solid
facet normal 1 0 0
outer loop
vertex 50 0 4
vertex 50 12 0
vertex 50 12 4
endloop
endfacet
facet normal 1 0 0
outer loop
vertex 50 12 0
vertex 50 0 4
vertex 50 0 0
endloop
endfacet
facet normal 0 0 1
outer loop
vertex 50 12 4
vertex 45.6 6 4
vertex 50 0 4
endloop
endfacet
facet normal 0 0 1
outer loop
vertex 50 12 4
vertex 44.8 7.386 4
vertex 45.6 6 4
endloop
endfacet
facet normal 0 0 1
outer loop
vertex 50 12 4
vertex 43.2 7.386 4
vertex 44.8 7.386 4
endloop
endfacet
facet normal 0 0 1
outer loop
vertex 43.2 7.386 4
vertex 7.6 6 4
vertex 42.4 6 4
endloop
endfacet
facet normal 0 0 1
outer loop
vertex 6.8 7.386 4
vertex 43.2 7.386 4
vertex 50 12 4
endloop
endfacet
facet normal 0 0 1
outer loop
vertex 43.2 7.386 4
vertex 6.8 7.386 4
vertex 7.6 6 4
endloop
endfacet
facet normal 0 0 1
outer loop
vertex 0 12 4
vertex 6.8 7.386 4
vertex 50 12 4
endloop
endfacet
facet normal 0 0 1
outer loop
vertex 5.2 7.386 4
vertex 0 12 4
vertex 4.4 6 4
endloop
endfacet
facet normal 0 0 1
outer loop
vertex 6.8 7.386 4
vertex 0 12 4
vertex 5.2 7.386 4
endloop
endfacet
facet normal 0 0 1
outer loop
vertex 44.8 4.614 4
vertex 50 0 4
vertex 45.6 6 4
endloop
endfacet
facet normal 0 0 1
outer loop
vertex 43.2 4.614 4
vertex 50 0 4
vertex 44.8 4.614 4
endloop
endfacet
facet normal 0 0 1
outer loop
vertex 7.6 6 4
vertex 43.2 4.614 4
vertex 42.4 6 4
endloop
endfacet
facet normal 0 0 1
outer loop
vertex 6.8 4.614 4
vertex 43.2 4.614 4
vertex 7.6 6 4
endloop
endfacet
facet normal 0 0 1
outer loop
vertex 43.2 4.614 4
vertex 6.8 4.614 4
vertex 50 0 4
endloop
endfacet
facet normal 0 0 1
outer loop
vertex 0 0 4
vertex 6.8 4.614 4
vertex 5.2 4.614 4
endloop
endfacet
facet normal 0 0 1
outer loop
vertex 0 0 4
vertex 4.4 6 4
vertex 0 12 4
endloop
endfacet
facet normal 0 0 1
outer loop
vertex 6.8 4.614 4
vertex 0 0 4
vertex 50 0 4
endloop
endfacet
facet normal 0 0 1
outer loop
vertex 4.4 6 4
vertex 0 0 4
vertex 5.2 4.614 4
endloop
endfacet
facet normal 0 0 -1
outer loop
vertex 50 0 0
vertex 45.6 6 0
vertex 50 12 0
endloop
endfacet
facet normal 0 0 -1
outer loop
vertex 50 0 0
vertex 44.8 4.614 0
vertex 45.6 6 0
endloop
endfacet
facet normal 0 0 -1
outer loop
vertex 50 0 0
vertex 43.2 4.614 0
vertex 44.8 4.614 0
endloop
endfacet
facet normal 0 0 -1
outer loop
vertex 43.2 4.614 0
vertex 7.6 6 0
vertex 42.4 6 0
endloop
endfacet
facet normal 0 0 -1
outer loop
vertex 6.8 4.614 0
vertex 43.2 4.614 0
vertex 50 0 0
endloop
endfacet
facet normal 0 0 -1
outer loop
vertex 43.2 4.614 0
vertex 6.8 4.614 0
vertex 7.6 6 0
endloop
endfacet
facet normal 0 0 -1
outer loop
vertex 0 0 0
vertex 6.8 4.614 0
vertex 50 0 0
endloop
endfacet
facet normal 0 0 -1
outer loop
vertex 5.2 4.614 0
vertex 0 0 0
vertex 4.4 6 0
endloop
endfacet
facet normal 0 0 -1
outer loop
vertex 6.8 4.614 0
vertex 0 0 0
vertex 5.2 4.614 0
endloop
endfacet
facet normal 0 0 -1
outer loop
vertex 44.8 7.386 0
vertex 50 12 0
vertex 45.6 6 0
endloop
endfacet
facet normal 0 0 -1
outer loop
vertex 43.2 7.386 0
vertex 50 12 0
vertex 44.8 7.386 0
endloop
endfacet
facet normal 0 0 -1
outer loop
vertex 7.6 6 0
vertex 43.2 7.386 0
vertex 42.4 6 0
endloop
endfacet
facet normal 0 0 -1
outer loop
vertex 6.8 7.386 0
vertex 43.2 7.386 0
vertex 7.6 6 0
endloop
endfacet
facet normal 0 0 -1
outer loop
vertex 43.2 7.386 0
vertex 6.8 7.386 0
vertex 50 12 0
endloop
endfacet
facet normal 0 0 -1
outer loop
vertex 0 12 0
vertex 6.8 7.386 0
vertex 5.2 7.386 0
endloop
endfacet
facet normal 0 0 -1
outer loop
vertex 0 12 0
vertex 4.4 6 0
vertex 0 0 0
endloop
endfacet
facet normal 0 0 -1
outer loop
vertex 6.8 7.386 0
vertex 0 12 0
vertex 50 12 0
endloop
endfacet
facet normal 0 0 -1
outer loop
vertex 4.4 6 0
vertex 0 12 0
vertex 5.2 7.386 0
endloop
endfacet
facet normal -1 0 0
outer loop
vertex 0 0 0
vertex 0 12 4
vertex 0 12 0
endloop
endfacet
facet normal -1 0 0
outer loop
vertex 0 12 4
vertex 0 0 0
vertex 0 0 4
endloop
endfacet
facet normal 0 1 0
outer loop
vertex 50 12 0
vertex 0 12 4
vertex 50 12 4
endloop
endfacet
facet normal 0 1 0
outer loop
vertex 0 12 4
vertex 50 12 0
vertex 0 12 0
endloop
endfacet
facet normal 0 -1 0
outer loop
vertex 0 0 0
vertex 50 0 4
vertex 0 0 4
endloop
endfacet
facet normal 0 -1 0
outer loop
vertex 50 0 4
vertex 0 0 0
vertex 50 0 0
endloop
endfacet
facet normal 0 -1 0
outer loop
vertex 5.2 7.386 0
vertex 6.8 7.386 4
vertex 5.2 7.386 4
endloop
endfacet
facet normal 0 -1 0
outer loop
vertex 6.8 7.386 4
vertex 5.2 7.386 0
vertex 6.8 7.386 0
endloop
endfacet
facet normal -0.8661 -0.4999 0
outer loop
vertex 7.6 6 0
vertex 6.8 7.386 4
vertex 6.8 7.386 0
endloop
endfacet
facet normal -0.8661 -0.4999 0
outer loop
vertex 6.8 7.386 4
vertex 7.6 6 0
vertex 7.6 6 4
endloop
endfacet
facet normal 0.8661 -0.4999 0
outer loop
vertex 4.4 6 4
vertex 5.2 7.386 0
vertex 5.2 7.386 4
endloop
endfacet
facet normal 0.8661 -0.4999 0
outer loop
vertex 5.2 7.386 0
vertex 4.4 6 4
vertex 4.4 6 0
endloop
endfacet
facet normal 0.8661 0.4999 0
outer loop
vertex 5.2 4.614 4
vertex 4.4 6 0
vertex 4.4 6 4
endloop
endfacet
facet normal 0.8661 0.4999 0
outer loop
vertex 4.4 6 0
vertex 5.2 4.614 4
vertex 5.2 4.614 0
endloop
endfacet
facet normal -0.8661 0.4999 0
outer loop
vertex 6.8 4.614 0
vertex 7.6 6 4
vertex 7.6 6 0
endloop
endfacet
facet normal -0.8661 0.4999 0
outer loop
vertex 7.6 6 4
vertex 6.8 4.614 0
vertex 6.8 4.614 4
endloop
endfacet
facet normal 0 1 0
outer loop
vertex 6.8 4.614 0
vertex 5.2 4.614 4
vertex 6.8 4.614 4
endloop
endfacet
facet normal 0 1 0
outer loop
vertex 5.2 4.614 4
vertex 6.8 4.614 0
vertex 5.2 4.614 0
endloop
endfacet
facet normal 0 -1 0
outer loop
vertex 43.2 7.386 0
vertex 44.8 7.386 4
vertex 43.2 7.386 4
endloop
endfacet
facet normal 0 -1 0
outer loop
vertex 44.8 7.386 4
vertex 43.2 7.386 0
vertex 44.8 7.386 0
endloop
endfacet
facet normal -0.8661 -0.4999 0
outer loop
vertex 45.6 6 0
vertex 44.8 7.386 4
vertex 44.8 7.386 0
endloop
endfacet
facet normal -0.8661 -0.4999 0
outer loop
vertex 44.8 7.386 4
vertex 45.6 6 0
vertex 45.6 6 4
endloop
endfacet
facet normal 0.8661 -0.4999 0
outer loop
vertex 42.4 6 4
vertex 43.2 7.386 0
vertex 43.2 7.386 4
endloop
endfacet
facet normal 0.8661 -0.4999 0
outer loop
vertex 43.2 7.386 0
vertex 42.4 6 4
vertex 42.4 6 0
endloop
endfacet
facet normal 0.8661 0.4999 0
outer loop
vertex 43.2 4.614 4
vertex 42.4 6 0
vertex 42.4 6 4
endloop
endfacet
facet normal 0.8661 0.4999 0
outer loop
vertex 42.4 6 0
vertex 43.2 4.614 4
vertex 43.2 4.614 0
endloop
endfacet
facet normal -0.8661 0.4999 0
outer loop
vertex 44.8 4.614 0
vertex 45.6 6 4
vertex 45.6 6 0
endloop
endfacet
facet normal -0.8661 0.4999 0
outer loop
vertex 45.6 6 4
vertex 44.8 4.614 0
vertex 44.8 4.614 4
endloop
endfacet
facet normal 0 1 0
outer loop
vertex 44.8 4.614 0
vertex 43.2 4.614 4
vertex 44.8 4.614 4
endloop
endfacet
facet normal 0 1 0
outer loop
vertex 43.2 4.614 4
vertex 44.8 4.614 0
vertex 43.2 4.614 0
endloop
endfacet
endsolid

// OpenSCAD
module gr_link() {
  w=12.0; t=4.0;
  len = 50;
  difference() {
    cube([len,w,t], center=false);
    translate([w/2, w/2, -1]) cylinder(h=t+2, d=3.2, center=false);
    translate([len-w/2, w/2, -1]) cylinder(h=t+2, d=3.2, center=false);
  }
}
gr_link();
